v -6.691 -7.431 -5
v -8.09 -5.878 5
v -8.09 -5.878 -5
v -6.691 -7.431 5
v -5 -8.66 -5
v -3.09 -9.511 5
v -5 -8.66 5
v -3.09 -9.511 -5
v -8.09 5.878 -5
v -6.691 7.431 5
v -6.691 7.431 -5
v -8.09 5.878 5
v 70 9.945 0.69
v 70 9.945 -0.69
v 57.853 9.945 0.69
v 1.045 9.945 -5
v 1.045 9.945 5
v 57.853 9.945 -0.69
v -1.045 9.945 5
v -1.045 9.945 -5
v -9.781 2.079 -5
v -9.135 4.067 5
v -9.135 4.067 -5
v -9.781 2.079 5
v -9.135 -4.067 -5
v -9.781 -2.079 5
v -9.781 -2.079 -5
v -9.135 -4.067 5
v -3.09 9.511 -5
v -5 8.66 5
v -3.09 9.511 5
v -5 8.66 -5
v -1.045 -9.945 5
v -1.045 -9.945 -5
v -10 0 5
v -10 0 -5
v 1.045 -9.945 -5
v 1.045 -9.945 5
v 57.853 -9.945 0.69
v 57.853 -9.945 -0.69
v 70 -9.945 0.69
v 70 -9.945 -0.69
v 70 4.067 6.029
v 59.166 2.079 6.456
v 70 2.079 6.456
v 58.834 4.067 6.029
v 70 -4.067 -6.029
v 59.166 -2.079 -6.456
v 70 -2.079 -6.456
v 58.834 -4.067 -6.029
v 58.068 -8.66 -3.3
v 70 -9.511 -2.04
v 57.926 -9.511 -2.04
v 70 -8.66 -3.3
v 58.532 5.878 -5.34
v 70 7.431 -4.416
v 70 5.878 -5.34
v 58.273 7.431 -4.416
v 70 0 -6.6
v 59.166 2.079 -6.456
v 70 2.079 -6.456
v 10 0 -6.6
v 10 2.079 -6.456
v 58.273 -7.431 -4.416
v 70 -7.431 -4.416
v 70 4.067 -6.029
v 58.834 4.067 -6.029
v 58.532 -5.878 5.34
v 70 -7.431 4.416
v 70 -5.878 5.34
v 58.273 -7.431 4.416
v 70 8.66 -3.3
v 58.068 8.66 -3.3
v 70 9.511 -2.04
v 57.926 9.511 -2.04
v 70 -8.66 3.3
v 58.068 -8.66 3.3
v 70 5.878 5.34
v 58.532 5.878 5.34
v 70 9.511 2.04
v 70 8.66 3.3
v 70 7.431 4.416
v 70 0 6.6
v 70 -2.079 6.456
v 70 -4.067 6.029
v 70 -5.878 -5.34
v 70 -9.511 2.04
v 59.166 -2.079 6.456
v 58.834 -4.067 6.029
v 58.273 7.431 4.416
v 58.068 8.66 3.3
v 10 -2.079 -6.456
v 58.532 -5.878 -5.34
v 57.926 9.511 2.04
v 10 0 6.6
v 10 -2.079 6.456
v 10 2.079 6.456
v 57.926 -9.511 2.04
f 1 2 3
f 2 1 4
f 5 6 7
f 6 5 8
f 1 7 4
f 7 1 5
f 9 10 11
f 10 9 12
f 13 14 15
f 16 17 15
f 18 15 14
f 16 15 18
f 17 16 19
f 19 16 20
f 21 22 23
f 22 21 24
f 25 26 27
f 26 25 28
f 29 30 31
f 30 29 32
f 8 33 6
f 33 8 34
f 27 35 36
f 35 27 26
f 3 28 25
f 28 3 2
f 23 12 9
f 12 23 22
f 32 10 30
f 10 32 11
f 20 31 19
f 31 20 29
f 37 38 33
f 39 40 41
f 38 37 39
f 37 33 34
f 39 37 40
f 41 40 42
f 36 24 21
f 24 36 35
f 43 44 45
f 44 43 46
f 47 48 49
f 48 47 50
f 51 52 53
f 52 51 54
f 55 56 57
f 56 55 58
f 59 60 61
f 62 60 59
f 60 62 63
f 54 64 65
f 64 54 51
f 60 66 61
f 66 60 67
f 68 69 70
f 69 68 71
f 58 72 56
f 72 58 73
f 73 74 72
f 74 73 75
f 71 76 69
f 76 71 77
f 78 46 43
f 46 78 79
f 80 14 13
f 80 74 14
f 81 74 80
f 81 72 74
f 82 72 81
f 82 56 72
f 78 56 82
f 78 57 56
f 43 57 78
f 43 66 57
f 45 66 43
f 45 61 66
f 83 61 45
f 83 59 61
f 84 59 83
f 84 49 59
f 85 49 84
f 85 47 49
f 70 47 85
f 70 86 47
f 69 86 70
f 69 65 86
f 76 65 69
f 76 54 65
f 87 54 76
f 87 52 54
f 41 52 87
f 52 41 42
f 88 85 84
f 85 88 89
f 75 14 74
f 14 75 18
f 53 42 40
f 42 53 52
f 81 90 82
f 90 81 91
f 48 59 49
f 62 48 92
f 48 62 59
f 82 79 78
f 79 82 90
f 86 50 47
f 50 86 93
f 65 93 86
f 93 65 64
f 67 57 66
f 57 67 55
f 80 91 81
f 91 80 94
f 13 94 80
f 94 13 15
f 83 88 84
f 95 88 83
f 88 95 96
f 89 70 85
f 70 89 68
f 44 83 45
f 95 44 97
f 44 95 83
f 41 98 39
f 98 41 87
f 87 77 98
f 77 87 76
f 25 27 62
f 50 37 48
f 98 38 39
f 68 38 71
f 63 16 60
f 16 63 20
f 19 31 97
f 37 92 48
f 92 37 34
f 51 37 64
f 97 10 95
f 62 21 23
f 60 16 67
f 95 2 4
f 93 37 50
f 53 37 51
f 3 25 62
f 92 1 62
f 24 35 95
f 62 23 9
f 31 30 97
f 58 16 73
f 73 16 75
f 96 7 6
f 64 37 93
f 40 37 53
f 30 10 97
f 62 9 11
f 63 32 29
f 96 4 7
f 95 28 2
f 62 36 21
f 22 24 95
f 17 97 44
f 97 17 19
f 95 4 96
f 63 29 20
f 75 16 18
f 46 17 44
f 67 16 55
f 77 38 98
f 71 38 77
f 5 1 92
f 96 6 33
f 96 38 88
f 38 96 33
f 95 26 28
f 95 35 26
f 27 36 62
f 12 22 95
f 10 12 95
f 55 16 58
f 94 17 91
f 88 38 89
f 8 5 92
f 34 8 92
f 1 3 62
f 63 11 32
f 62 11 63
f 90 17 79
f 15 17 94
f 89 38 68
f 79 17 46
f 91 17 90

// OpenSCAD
radio= 10;
altura=10;
largo=60;
escalaY=0;
escalaX=0.33;
// Demo code
 unionRound(50, 1) {
     cylinder(r=radio,h=altura,center=true);
     translate([radio,0, 0])rotate([0, 90, 0])scale([0.66,1,1])
     cylinder(r=altura,h=largo);
} // end of demo code


 unionRound(50, 1) {
     cylinder(r=radio,h=altura,center=true);
     translate([radio,0, 0])rotate([0, 90, 0])scale([0.66,1,1])
     cylinder(r=altura,h=largo);
} // end of demo code
module unionRound(r, detail = 5) {
    epsilon = 1e-6;
    children(0);
    children(1);
    step = 1 / detail;
    for (i = [0: step: 1 - step]) {
        {
            x = r - sin(i * 90) * r;
            y = r - cos(i * 90) * r;
            xi = r - sin((i + step) * 90) * r;
            yi = r - cos((i + step) * 90) * r;
           // color(rands(0, 1, 3, i))
            hull() {
                intersection() {
                    // shell(epsilon) 
                    clad(x) children(0);
                    // shell(epsilon) 
                    clad(y) children(1);
                }
                intersection() {
                    // shell(epsilon) 
                    clad(xi) children(0);
                    // shell(epsilon) 
                    clad(yi) children(1);
                }
            }
        }
    }
}
// unionRound helper expand by r
module clad(r) {
    minkowski() {
        children();
        //        icosphere(r,2);
        sphere(r, $fn = 19.5);
    }
}
// unionRound helper
module shell(r) {
    difference() {
        clad(r) children();
        children();
    }
}
